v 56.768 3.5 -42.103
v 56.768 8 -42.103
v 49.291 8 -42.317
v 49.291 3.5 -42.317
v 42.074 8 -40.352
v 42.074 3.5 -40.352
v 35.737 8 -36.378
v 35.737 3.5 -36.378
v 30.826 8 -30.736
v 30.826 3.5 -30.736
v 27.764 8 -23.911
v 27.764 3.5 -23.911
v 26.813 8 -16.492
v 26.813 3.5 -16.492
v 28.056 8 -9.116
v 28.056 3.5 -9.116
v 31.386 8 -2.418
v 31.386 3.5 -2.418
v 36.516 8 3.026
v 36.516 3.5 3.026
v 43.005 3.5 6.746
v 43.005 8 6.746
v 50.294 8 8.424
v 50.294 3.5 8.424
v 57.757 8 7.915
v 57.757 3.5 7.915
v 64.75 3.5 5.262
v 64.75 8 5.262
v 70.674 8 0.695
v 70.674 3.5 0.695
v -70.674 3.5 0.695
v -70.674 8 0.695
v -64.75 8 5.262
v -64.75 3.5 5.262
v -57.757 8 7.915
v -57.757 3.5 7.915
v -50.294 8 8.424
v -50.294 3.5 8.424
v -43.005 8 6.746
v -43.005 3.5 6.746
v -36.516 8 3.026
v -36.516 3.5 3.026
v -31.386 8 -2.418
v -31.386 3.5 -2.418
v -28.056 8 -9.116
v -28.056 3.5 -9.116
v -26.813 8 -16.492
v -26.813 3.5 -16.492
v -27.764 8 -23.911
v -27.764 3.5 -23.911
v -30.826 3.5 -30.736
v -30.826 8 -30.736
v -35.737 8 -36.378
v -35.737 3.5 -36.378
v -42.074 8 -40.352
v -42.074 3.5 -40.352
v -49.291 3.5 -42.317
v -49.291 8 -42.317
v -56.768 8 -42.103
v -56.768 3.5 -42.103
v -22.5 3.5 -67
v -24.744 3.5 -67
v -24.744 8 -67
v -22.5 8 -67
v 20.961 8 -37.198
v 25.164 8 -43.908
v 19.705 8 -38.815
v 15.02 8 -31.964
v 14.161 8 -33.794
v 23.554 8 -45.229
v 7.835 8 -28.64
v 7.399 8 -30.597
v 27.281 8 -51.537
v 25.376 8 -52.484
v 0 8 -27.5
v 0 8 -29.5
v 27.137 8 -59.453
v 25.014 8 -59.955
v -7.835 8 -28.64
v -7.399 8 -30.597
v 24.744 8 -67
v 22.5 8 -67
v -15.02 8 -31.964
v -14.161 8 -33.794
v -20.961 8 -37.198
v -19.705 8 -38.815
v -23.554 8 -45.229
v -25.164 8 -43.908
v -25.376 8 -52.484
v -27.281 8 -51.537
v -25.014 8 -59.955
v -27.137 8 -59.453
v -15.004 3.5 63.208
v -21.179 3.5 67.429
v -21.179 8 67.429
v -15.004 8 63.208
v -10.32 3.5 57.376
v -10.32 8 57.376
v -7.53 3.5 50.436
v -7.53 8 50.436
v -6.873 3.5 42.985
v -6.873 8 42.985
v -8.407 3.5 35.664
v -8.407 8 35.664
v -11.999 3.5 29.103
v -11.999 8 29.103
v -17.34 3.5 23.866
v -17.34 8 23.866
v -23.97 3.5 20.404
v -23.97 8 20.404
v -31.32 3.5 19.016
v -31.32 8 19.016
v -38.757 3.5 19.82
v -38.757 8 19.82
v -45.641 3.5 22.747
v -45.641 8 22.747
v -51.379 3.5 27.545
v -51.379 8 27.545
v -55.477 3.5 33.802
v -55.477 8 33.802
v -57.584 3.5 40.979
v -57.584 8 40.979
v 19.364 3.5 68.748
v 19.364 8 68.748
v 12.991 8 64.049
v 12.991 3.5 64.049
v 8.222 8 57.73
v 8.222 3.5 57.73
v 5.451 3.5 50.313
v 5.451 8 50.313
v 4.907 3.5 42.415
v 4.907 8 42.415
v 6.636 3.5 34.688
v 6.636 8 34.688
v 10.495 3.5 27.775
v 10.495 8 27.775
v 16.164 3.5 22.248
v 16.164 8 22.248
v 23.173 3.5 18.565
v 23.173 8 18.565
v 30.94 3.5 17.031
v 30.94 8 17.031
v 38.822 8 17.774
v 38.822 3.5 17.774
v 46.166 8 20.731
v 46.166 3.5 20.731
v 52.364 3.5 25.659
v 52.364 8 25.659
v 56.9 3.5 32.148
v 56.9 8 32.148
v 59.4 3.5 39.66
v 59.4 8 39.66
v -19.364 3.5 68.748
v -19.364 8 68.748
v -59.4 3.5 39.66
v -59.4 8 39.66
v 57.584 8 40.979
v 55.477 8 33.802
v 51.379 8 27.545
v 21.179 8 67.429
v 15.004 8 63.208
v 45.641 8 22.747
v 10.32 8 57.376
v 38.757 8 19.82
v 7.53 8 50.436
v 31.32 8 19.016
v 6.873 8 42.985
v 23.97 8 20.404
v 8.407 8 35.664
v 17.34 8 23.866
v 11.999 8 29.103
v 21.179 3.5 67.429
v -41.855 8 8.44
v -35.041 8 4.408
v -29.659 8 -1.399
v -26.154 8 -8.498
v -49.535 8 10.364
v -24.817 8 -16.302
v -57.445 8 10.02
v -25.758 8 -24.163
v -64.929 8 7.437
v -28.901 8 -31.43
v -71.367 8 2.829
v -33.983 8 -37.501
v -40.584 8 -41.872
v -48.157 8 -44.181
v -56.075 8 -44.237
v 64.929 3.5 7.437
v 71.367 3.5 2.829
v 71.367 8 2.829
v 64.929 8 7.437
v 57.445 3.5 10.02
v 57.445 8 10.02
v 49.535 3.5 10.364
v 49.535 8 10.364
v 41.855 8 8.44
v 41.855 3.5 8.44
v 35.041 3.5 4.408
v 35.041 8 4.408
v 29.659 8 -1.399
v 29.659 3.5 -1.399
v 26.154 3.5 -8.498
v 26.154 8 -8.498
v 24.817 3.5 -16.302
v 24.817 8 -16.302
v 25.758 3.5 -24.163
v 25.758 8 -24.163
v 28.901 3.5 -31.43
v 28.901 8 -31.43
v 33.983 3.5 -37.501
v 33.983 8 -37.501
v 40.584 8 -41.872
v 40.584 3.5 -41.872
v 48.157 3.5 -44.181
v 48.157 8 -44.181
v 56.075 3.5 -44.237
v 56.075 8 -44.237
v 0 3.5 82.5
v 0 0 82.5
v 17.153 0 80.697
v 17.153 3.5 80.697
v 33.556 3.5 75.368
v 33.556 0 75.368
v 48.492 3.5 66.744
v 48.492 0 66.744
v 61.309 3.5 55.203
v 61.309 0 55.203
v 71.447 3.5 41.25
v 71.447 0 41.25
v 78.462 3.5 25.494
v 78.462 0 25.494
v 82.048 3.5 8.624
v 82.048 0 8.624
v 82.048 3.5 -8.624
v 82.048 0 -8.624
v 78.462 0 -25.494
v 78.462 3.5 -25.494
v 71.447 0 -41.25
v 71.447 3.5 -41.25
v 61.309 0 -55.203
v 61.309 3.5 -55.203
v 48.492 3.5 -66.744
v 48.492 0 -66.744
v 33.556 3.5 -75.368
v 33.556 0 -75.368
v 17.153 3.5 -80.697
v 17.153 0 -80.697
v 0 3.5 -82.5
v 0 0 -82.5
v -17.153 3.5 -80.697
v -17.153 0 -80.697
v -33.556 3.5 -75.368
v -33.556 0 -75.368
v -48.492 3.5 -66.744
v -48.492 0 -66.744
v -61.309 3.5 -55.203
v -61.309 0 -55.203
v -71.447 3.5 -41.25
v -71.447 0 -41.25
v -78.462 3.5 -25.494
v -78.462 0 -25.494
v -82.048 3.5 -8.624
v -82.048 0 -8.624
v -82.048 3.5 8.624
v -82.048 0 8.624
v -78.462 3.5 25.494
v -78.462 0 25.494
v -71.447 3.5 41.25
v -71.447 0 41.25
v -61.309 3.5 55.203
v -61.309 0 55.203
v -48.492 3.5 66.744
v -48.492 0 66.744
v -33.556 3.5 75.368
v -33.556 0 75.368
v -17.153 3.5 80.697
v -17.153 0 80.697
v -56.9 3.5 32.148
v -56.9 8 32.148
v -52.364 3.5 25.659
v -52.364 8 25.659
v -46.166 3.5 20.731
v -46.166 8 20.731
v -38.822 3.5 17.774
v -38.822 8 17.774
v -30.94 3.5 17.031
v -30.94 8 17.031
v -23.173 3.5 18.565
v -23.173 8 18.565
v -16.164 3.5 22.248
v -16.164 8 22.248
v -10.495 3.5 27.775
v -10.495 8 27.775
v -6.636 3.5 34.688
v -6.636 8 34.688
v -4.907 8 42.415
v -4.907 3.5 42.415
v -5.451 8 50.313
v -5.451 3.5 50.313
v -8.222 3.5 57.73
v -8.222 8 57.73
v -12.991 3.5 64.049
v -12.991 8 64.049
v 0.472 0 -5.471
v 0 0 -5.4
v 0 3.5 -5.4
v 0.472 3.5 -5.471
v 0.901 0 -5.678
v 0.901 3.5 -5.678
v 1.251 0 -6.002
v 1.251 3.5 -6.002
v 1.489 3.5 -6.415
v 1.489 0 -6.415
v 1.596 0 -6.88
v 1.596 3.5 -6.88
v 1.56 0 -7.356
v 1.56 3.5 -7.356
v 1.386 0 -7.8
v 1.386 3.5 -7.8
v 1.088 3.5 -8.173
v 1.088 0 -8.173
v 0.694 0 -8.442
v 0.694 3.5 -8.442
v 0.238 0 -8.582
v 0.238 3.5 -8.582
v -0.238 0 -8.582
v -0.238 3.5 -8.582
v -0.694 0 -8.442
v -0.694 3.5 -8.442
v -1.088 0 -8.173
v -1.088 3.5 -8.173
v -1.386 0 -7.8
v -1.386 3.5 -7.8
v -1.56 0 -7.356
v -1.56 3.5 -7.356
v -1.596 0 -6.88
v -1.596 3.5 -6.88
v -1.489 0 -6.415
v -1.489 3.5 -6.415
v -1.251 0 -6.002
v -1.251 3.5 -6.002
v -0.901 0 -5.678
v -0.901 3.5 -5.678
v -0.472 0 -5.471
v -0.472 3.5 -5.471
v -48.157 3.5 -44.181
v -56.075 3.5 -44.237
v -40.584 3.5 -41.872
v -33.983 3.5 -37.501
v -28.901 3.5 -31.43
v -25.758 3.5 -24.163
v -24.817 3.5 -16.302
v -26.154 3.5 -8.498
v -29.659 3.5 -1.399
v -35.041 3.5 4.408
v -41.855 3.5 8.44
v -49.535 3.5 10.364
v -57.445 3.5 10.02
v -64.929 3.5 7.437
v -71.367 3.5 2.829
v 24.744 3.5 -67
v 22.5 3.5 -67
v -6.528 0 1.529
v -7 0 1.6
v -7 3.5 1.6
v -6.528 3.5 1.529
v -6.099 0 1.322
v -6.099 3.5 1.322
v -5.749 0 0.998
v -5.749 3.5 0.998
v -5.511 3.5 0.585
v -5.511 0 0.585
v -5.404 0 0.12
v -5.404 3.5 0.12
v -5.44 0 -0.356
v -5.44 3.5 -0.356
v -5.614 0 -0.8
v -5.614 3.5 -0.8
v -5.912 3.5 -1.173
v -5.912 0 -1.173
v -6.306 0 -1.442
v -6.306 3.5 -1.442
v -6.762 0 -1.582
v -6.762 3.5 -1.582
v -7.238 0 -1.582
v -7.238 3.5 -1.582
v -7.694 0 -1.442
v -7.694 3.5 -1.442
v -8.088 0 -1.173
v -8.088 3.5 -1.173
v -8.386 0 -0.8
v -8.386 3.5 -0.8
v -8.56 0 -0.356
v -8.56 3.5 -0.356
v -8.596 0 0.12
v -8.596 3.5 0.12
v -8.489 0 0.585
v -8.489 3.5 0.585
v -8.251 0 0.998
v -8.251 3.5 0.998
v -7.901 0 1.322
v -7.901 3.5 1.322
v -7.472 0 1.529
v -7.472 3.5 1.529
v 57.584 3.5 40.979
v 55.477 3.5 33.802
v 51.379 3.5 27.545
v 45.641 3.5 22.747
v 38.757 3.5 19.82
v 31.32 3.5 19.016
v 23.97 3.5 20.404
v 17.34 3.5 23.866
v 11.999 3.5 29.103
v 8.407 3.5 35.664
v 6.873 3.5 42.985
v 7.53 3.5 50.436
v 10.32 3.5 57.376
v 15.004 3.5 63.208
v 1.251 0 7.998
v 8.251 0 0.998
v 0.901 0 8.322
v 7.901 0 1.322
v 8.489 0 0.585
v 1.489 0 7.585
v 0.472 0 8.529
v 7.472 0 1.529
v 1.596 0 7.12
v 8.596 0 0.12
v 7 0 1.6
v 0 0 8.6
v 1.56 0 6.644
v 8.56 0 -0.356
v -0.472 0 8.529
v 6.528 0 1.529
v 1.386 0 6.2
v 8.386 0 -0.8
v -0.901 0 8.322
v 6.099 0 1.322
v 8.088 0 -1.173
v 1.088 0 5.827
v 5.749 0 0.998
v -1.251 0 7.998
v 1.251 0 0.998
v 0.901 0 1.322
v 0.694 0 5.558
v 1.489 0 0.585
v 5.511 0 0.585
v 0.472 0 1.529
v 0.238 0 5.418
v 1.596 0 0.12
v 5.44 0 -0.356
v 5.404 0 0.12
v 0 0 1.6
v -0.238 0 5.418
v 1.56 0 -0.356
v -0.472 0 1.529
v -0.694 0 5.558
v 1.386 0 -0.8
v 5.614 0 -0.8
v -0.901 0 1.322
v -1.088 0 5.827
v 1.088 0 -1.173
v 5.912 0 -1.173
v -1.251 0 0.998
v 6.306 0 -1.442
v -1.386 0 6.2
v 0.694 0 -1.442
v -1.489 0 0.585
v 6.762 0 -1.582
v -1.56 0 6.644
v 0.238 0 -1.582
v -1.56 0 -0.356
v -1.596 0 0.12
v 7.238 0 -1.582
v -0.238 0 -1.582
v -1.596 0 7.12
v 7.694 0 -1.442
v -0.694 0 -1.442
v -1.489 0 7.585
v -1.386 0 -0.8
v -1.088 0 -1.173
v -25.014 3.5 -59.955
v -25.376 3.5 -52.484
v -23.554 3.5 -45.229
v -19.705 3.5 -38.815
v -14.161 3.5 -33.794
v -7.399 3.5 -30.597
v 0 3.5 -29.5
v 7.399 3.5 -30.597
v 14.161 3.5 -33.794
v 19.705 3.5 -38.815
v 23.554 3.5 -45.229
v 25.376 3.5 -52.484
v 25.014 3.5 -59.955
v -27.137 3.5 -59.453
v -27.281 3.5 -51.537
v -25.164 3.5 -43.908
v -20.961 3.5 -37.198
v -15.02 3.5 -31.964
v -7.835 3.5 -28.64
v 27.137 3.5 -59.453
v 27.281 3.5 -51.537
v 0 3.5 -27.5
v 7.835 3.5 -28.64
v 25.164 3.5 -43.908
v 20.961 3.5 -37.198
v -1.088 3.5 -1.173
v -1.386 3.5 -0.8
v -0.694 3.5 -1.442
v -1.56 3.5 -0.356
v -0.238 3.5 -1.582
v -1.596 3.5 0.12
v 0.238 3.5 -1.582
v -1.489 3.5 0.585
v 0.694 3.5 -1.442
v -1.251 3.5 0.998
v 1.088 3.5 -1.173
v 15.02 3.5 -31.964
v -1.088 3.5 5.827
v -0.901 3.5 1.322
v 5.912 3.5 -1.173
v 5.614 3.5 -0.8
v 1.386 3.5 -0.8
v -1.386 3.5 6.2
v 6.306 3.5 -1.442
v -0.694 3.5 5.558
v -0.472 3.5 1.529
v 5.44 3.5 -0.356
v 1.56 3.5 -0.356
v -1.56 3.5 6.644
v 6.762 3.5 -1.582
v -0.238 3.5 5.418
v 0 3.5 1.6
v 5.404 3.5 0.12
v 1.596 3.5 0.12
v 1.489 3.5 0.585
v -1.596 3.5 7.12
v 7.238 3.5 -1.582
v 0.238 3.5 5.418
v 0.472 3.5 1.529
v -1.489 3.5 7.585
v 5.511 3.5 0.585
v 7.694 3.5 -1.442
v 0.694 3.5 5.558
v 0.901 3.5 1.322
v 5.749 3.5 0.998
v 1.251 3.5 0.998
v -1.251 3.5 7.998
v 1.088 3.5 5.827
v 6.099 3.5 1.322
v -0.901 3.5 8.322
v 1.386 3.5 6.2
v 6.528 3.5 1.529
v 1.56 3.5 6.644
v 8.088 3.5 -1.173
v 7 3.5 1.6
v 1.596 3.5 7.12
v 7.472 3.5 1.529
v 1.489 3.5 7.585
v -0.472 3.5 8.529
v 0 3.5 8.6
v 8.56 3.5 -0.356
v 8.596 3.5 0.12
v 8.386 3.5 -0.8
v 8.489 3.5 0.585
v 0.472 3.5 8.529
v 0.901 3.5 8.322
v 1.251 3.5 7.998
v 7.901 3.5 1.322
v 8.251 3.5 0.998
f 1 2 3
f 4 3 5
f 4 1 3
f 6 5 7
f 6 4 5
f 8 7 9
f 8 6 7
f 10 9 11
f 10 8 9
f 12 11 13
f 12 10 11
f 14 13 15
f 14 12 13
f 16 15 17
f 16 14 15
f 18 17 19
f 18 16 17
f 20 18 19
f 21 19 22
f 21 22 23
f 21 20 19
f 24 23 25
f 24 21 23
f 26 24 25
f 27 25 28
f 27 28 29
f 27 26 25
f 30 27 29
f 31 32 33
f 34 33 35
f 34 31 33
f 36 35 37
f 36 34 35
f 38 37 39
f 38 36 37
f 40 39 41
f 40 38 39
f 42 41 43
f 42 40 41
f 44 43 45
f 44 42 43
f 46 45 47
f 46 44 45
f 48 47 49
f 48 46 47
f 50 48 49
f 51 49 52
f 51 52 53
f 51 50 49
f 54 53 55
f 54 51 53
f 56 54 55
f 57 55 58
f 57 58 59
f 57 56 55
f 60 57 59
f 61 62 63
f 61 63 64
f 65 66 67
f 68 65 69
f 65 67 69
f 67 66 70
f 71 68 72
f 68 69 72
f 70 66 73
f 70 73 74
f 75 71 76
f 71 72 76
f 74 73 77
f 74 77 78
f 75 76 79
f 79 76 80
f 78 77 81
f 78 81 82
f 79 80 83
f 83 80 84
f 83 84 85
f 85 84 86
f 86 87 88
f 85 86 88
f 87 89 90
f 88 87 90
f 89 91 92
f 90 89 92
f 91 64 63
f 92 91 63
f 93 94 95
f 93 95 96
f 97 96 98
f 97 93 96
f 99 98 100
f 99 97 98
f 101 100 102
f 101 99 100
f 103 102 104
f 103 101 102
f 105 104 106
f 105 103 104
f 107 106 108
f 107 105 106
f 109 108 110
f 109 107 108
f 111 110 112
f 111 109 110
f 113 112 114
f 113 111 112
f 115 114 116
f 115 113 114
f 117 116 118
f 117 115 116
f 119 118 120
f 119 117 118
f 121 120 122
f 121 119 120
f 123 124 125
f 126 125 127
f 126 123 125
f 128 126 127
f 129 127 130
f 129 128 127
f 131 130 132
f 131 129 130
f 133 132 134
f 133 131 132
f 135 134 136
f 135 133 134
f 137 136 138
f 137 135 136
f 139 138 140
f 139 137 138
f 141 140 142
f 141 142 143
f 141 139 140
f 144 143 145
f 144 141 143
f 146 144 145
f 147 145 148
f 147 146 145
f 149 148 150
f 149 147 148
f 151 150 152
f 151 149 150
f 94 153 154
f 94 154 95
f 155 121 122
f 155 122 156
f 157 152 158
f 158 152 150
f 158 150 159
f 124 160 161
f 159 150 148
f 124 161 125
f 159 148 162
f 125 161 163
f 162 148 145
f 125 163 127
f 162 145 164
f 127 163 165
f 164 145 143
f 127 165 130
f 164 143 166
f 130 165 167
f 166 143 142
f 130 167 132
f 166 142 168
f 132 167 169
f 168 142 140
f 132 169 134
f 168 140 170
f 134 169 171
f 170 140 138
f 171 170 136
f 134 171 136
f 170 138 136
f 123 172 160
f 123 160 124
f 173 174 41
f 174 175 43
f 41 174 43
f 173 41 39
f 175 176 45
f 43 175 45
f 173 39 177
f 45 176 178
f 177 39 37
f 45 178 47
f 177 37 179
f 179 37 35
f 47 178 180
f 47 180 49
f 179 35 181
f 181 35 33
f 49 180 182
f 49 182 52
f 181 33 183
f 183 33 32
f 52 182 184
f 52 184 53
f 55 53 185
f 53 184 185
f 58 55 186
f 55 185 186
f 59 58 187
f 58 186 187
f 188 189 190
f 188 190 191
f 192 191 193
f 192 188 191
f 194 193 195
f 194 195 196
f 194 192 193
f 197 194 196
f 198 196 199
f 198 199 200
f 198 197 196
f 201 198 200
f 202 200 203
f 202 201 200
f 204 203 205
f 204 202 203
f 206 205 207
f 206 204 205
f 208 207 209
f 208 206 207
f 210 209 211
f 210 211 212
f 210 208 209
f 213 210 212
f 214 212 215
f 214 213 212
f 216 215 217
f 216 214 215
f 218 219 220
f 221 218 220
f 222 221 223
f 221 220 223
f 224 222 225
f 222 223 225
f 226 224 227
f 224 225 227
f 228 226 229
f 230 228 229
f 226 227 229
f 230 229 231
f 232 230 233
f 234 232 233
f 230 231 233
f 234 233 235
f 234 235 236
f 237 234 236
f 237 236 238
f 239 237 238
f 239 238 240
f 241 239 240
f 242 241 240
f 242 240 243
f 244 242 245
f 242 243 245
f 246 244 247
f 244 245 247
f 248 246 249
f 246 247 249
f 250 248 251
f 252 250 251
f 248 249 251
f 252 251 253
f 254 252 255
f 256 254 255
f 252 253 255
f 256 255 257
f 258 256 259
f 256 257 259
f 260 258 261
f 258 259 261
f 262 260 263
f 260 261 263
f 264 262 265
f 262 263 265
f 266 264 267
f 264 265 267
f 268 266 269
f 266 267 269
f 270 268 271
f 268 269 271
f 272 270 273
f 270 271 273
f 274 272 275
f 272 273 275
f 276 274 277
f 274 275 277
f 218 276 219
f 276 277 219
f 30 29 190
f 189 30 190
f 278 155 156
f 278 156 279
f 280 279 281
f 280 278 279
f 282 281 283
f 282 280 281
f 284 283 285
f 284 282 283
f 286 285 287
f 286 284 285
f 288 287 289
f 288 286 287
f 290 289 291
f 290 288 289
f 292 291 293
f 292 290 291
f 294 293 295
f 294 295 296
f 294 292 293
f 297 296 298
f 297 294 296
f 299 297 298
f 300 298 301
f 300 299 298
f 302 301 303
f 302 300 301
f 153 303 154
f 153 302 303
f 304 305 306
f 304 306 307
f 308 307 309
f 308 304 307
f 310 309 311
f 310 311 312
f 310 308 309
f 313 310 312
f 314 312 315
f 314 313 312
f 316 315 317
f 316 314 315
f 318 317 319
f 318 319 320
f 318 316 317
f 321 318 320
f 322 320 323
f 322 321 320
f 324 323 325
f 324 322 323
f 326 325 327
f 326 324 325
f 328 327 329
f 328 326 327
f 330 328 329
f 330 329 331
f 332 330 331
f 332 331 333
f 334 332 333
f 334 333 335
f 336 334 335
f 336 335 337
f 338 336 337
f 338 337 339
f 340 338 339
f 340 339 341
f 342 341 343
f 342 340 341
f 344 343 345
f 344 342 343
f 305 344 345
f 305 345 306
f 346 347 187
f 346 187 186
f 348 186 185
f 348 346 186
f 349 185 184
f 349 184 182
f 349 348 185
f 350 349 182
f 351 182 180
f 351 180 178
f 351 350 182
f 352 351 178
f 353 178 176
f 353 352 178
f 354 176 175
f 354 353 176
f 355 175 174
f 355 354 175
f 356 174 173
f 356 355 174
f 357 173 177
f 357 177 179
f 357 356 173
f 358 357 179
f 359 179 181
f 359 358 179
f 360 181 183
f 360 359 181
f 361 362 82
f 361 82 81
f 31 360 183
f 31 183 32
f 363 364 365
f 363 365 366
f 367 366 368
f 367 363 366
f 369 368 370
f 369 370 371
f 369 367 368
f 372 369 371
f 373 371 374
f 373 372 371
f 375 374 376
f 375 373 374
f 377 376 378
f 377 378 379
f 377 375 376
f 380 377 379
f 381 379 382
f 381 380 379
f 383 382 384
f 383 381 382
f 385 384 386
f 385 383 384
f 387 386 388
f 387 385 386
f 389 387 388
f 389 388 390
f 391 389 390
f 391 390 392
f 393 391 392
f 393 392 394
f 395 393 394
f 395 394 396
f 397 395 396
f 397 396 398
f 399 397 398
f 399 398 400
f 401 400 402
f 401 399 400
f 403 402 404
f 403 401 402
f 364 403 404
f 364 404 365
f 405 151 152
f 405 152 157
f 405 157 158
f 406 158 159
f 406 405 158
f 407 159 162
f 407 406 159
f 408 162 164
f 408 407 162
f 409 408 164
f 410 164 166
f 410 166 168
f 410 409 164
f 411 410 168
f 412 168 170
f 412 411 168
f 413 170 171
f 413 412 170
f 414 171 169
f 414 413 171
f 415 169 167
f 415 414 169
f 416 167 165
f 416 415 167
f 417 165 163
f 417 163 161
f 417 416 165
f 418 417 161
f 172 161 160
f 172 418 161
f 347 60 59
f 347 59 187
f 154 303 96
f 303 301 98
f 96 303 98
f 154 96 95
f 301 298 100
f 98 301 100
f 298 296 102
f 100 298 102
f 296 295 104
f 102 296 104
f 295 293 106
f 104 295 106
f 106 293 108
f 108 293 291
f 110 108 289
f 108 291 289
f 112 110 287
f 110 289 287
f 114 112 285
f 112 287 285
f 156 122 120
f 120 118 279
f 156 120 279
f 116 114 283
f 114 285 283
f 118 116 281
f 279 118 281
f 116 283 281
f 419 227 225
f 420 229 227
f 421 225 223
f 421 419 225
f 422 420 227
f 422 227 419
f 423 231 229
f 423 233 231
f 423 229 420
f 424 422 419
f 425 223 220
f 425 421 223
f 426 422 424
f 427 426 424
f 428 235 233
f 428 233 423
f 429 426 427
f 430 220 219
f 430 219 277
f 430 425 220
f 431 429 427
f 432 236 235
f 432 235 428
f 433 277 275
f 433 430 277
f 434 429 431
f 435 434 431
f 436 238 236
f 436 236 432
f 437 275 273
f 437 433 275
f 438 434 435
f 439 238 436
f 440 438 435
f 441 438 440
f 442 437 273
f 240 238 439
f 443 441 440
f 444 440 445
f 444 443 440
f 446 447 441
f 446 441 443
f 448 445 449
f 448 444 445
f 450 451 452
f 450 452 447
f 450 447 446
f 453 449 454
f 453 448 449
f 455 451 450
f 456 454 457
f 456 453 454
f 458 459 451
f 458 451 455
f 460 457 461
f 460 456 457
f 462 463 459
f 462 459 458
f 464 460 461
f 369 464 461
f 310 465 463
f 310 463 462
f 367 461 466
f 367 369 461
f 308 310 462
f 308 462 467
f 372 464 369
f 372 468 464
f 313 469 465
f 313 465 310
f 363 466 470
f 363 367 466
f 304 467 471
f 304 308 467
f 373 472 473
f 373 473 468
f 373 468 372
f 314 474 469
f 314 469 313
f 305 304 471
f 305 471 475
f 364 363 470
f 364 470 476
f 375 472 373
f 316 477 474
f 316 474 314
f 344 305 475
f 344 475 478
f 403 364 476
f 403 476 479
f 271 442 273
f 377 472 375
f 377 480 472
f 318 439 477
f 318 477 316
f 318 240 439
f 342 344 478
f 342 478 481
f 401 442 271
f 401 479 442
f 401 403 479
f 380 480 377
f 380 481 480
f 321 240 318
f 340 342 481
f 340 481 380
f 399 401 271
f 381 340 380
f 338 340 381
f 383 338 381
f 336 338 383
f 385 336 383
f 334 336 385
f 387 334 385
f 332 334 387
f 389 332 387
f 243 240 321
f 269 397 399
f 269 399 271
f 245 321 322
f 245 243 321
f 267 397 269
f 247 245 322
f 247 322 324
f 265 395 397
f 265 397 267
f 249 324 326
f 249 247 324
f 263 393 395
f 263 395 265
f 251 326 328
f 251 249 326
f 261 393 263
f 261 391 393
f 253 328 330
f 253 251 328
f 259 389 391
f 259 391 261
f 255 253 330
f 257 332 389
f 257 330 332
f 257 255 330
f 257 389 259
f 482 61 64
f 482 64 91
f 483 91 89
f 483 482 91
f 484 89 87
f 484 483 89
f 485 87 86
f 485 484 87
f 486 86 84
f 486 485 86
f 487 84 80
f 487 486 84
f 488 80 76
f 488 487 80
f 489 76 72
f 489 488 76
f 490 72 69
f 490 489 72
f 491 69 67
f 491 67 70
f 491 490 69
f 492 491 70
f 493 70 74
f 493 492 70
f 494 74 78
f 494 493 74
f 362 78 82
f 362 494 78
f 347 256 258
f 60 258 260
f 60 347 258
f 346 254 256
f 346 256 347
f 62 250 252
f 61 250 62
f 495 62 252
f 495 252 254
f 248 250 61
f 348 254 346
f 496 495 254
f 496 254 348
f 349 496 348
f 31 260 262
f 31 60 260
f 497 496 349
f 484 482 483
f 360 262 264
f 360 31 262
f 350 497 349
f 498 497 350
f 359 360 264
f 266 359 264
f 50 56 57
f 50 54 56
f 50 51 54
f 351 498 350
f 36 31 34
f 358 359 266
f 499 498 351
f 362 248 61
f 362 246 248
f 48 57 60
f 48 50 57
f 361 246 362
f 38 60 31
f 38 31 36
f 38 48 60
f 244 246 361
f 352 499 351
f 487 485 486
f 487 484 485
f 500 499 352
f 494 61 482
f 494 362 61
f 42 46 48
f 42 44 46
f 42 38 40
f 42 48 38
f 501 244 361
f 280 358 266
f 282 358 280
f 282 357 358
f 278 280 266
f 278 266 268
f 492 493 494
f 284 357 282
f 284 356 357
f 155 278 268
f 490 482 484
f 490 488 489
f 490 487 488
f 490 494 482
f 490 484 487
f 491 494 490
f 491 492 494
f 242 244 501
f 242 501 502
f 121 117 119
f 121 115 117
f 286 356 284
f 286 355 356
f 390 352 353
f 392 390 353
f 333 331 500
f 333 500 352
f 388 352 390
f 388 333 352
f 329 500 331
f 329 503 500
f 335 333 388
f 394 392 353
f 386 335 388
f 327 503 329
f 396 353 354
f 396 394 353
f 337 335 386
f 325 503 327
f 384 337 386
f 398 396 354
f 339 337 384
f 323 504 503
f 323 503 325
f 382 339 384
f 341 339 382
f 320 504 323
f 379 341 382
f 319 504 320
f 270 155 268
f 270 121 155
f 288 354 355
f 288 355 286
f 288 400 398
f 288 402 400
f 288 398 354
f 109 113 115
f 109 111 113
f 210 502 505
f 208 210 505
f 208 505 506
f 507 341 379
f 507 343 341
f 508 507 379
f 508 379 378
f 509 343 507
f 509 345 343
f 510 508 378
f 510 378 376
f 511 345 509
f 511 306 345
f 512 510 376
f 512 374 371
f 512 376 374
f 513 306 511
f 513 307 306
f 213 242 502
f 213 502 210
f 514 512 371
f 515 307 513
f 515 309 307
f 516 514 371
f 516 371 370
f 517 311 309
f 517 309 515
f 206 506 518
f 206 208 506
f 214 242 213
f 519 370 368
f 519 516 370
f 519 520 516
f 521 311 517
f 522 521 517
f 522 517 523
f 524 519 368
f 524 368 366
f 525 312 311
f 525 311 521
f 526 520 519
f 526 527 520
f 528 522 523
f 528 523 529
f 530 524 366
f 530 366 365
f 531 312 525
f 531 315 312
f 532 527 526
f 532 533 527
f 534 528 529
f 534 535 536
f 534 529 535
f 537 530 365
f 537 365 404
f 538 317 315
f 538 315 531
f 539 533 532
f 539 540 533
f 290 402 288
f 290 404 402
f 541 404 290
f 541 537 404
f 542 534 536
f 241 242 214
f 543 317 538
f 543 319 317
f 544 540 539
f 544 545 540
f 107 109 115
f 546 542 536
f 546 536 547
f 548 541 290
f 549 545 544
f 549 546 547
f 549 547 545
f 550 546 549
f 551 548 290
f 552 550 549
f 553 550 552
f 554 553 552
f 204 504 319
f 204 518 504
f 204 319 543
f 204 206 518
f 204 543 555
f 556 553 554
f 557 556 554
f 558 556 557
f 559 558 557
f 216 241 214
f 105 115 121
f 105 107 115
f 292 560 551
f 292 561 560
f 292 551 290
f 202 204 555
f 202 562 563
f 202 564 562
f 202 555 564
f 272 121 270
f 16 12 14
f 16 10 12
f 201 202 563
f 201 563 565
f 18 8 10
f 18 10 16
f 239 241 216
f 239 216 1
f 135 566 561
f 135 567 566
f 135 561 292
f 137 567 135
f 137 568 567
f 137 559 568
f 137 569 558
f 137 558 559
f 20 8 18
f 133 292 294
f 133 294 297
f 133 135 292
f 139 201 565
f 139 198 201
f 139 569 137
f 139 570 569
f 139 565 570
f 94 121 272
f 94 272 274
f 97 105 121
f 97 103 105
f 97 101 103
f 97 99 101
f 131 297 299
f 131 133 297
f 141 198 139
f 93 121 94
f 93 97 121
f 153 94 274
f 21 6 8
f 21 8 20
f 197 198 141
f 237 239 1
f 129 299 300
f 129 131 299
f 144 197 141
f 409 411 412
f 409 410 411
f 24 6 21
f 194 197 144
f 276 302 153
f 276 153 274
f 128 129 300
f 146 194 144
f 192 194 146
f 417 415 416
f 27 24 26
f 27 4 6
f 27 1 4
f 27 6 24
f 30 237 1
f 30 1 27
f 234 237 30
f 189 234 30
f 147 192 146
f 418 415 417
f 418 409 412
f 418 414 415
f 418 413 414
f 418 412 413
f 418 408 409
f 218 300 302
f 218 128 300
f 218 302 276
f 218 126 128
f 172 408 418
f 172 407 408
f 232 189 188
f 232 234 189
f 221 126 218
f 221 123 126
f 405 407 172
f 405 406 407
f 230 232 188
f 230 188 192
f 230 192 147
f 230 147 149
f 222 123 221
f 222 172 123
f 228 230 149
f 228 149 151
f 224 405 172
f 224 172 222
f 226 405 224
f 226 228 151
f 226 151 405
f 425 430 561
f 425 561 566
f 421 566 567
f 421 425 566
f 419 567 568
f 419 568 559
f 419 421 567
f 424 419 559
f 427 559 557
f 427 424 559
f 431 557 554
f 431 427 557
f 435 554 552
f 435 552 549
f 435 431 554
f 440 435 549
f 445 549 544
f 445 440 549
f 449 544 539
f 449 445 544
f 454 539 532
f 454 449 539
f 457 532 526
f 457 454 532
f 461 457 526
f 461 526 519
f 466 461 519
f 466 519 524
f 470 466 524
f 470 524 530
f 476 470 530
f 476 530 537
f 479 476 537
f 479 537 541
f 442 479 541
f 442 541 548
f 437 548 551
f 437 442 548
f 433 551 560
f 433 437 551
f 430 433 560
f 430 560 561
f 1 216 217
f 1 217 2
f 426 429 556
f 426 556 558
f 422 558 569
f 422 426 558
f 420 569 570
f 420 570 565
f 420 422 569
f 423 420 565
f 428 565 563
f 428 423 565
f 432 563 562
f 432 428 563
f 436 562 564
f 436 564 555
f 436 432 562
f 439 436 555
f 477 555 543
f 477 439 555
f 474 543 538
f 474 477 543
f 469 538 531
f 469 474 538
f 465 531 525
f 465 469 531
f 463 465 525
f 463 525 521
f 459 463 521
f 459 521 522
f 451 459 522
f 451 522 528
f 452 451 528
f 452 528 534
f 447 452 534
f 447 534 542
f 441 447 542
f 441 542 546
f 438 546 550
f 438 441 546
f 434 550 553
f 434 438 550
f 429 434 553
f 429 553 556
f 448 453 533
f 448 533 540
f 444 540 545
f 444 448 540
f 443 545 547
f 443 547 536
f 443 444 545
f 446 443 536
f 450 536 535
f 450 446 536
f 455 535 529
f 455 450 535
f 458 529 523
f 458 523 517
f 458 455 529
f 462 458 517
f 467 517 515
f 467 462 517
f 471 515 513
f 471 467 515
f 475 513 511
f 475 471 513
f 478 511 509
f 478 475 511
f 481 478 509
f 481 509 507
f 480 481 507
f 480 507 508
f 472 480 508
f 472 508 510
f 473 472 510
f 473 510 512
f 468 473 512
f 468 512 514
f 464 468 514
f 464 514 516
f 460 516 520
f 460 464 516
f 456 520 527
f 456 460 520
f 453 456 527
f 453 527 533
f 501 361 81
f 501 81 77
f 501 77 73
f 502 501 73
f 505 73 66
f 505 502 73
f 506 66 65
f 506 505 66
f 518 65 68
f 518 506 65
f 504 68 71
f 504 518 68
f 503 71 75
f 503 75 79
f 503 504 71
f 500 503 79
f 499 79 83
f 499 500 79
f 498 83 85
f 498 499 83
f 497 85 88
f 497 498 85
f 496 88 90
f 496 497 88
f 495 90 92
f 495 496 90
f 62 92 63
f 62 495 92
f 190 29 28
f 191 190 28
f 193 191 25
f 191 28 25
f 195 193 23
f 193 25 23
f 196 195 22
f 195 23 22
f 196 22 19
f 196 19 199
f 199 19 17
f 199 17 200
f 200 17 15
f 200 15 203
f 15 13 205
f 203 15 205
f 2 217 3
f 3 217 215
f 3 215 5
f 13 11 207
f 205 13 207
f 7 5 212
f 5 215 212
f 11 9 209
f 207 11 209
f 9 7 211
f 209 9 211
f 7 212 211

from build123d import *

# Parameters (mm, degrees)
SKETCH_2_R      = 82.5
SKETCH_2_R_2    = 1.6
EXTRUDE_1_DEPTH = 3.5
EXTRUDE_2_DEPTH = 8


with BuildPart() as part:
    # 草图2 → 凸台-拉伸1 (new body)
    with BuildSketch(Plane(origin=(0, 0, 0), x_dir=(1, 0, 0), z_dir=(0, 1, 0))):
        Circle(SKETCH_2_R)
        with Locations((0, -7)):
            Circle(SKETCH_2_R_2, mode=Mode.SUBTRACT)
        with Locations((-7, 0)):
            Circle(SKETCH_2_R_2, mode=Mode.SUBTRACT)
        Circle(SKETCH_2_R_2, mode=Mode.SUBTRACT)
        with Locations((7, 0)):
            Circle(SKETCH_2_R_2, mode=Mode.SUBTRACT)
        with Locations((0, 7)):
            Circle(SKETCH_2_R_2, mode=Mode.SUBTRACT)
    extrude(amount=EXTRUDE_1_DEPTH)

    # 草图2<3> → 凸台-拉伸2 (add)
    with BuildSketch(Plane(origin=(0, 0, 0), x_dir=(1, 0, 0), z_dir=(0, 1, 0))):
        with BuildLine():
            ThreePointArc((22.5, 67), (0, 29.5), (-22.5, 67))
            Line((-22.5, 67), (-24.743686063, 67))
            ThreePointArc((-24.743686063, 67), (0, 27.5), (24.743686063, 67))
            Line((24.743686063, 67), (22.5, 67))
        make_face()
        with BuildLine():
            ThreePointArc((70.673668965, -0.694632994), (28.056167231, 9.116001334), (56.767904218, 42.10291024))
            Line((56.767904218, 42.10291024), (56.074567095, 44.236782491))
            ThreePointArc((56.074567095, 44.236782491), (26.154054198, 8.497967345), (71.367006089, -2.828505245))
            Line((71.367006089, -2.828505245), (70.673668965, -0.694632994))
        make_face()
        with BuildLine():
            ThreePointArc((21.17872953, -67.4293068), (17.339664943, -23.866001334), (57.584494277, -40.978970447))
            Line((57.584494277, -40.978970447), (59.399674432, -39.660164868))
            ThreePointArc((59.399674432, -39.660164868), (16.164094438, -22.247967345), (19.363549375, -68.748112378))
            Line((19.363549375, -68.748112378), (21.17872953, -67.4293068))
        make_face()
        with BuildLine():
            ThreePointArc((-57.584494277, -40.978970447), (-17.339664943, -23.866001334), (-21.17872953, -67.4293068))
            Line((-21.17872953, -67.4293068), (-19.363549375, -68.748112378))
            ThreePointArc((-19.363549375, -68.748112378), (-16.164094438, -22.247967345), (-59.399674432, -39.660164868))
            Line((-59.399674432, -39.660164868), (-57.584494277, -40.978970447))
        make_face()
        with BuildLine():
            ThreePointArc((-56.767904218, 42.10291024), (-28.056167231, 9.116001334), (-70.673668965, -0.694632994))
            Line((-70.673668965, -0.694632994), (-71.367006089, -2.828505245))
            ThreePointArc((-71.367006089, -2.828505245), (-26.154054198, 8.497967345), (-56.074567095, 44.236782491))
            Line((-56.074567095, 44.236782491), (-56.767904218, 42.10291024))
        make_face()
    extrude(amount=EXTRUDE_2_DEPTH)


solid = part.part
